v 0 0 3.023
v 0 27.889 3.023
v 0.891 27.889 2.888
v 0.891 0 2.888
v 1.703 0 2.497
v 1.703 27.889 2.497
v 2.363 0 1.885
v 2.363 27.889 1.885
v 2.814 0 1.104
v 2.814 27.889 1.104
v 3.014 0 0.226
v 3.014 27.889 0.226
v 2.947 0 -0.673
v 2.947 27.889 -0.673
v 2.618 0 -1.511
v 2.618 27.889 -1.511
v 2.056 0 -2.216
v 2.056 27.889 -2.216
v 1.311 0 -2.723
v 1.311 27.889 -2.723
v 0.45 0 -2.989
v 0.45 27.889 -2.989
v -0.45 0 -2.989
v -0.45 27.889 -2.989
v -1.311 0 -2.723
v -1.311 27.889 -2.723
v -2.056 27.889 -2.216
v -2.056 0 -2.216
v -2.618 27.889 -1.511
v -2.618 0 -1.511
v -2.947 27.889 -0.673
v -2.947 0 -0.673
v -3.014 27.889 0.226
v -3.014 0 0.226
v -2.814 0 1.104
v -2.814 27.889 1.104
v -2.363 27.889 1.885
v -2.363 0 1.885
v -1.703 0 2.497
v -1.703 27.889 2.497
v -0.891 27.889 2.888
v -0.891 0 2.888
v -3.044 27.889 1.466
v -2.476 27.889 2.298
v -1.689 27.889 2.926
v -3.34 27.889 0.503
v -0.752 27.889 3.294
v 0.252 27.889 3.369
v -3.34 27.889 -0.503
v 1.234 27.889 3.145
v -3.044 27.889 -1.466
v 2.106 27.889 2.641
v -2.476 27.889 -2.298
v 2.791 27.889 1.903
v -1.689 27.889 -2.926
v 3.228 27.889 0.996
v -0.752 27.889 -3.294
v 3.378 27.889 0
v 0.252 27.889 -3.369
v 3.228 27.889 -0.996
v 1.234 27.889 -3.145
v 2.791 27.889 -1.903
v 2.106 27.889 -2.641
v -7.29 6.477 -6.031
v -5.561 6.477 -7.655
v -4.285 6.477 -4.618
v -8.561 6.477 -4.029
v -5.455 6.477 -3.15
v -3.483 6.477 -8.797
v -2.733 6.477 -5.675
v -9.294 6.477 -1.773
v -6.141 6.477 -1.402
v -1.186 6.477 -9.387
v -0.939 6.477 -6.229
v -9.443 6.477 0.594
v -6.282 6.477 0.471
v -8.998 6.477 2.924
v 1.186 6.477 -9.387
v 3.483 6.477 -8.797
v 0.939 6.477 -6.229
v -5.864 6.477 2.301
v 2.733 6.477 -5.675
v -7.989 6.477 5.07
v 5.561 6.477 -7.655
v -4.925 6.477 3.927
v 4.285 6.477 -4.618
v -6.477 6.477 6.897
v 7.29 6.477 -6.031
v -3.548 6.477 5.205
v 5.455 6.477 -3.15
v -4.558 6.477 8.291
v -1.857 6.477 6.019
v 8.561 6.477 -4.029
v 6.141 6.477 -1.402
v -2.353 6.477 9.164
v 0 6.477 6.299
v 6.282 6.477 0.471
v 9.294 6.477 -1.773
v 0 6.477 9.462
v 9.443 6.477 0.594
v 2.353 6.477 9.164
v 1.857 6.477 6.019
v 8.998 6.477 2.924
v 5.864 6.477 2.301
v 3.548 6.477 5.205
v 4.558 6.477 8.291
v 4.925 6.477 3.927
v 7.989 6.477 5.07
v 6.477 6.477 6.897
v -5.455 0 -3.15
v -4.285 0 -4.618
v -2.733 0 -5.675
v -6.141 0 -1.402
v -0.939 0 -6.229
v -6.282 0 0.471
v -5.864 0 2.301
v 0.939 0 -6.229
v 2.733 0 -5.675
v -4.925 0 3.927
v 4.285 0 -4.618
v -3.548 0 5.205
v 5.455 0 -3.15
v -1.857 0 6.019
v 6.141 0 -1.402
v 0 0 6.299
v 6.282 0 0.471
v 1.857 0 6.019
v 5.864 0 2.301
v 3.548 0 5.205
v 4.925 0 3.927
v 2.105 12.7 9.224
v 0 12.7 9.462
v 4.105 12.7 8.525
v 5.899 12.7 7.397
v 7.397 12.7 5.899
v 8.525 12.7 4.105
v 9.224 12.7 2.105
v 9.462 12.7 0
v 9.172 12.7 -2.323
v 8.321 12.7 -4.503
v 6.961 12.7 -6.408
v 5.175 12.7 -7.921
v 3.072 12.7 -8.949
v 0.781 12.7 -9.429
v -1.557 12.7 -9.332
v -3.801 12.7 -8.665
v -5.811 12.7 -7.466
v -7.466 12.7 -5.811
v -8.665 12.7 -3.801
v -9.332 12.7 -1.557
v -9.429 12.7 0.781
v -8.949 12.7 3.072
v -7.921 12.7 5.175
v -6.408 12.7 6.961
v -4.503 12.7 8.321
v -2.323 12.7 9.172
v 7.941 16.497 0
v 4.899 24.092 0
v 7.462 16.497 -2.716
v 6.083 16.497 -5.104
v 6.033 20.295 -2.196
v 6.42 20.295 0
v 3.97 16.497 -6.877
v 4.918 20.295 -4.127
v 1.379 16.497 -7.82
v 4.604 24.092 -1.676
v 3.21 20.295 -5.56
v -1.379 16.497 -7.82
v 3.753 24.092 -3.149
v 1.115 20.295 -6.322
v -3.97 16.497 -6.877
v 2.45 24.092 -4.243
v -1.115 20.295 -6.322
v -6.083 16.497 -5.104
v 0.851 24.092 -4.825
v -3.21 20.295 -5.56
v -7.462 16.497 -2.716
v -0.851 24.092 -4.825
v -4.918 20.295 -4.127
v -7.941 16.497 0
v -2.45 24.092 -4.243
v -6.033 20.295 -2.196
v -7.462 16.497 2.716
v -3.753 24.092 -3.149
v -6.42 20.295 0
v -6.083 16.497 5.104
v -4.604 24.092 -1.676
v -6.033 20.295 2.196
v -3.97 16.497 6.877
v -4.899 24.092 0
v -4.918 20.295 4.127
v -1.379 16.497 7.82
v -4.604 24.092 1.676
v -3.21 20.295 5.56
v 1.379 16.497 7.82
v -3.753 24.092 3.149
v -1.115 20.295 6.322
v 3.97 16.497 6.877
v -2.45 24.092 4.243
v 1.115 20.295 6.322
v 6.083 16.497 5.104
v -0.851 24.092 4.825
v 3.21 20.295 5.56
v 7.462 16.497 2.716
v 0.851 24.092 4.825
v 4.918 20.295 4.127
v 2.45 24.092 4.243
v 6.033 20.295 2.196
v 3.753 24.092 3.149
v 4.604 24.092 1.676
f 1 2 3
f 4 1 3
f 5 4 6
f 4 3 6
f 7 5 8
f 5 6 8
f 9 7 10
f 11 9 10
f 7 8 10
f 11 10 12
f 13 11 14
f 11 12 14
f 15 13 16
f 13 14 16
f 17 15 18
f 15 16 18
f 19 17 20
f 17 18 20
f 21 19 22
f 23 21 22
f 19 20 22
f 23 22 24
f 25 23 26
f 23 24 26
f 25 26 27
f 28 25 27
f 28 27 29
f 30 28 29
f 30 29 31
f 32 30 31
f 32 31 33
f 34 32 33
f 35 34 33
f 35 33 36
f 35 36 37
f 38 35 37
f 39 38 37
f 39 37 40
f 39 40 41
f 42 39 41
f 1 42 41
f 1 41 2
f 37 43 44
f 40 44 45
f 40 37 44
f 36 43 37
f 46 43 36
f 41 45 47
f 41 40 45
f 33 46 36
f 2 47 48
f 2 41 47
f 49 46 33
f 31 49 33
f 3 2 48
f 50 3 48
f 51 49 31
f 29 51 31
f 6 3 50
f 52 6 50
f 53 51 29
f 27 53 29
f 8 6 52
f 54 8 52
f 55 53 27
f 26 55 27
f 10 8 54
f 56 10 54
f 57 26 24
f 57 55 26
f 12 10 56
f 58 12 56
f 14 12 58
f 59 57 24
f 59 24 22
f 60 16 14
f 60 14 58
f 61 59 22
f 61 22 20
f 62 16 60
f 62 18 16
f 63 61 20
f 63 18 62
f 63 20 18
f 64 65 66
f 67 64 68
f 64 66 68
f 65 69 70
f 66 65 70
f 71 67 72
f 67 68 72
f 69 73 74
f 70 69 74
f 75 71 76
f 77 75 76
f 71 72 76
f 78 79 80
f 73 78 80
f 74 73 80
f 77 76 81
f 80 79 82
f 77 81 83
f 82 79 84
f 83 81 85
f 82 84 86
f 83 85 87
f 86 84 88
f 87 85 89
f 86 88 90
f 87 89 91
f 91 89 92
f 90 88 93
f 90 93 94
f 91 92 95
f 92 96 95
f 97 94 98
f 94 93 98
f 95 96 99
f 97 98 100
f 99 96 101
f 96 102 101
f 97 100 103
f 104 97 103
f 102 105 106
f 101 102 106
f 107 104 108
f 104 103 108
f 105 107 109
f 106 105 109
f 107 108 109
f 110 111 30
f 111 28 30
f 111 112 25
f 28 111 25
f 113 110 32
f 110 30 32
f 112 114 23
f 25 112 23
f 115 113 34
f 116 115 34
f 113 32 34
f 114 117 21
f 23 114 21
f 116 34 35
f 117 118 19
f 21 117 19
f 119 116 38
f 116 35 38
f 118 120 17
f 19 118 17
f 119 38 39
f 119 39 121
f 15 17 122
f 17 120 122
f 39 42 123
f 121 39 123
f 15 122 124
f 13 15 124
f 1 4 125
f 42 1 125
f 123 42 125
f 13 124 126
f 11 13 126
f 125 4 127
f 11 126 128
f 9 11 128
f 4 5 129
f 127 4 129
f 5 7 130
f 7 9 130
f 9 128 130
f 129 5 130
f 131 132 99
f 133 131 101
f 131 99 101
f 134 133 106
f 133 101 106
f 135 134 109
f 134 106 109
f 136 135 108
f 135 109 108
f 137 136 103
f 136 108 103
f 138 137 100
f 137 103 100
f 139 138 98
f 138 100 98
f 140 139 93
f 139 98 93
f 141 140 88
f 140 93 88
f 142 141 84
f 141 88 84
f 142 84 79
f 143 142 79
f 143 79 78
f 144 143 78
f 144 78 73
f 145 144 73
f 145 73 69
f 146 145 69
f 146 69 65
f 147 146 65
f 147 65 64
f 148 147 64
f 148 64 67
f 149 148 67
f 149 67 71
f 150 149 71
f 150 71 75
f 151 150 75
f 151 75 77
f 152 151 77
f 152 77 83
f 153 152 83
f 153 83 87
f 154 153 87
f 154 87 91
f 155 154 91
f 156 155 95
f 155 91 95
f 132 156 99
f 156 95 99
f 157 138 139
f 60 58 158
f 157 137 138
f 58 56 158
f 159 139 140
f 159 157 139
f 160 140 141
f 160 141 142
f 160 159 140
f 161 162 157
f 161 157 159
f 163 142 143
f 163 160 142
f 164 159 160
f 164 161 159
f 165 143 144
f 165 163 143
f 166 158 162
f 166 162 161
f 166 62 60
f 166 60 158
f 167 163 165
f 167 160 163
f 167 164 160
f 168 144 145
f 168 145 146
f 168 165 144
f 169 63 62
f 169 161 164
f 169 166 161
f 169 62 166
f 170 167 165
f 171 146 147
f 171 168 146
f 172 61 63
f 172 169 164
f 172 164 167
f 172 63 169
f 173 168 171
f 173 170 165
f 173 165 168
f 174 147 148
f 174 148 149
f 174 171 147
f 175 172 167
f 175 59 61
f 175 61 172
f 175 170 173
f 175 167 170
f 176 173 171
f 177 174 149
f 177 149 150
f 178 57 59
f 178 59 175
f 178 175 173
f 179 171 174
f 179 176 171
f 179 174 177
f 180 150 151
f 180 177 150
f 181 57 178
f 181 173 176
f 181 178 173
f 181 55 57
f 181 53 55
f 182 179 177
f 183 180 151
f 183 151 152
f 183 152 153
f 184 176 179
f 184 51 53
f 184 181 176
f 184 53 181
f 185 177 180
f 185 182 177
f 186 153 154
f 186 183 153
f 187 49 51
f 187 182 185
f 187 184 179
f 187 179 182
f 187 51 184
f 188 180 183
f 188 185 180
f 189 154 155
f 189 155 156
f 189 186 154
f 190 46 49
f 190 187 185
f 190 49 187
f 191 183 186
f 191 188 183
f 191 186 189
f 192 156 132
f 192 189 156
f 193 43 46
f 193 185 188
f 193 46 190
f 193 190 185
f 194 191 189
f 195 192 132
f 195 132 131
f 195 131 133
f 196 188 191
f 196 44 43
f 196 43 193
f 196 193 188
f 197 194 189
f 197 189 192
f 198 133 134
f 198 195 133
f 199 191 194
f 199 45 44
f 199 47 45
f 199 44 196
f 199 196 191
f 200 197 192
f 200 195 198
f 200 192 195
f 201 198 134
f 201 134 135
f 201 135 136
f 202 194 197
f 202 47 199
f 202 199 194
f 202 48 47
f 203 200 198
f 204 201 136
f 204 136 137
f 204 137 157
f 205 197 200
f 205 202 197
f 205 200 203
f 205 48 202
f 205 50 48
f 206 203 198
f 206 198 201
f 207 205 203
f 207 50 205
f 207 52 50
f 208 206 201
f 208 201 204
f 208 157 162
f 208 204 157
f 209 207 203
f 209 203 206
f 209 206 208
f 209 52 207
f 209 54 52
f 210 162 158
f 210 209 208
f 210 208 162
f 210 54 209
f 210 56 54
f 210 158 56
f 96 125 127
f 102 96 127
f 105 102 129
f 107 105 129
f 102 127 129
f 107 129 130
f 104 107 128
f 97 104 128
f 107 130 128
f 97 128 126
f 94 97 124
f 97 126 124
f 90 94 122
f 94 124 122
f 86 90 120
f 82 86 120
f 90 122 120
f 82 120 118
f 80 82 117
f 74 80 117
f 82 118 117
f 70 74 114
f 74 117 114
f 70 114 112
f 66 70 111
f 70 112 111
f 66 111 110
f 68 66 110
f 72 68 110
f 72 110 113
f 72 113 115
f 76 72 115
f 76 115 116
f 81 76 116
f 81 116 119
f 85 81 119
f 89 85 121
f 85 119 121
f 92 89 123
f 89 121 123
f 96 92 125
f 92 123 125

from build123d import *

# Parameters (mm, degrees)
SKETCH1_R           = 6.2992
BOSS_EXTRUDE1_DEPTH = 6.477
SKETCH2_R           = 9.4615
BOSS_EXTRUDE2_DEPTH = 6.223
SKETCH5_R           = 9.4615
SKETCH6_R           = 3.3782
SKETCH7_R           = 3.0226
CUT_EXTRUDE1_DEPTH  = 31.932950796


with BuildPart() as part:
    # Sketch1 → Boss-Extrude1 (new body)
    with BuildSketch(Plane(origin=(0, 0, 0), x_dir=(1, 0, 0), z_dir=(0, 1, 0))):
        with Locations(Location((0, 0, 0), (0, 0, 270))):
            Circle(SKETCH1_R)
    extrude(amount=BOSS_EXTRUDE1_DEPTH)

    # Sketch2 → Boss-Extrude2 (add)
    with BuildSketch(Plane(origin=(0, 6.477, 0), x_dir=(1, 0, 0), z_dir=(0, 1, 0))):
        with Locations(Location((0, 0, 0), (0, 0, 270))):
            Circle(SKETCH2_R)
    extrude(amount=BOSS_EXTRUDE2_DEPTH)

    # Sketch5 → Loft2 section 0
    with BuildSketch(Plane(origin=(0, 12.7, 0), x_dir=(1, 0, 0), z_dir=(0, 1, 0))):
        Circle(SKETCH5_R)
    # Sketch6 → Loft2 section 1
    with BuildSketch(Plane(origin=(0, 27.8892, 0), x_dir=(1, 0, 0), z_dir=(0, 1, 0))):
        Circle(SKETCH6_R)
    loft()

    # Sketch7 → Cut-Extrude1 (cut, through all)
    with BuildSketch(Plane(origin=(0, 27.8892, 0), x_dir=(1, 0, 0), z_dir=(0, 1, 0))):
        with Locations(Location((0, 0, 0), (0, 0, 270))):
            Circle(SKETCH7_R)
    extrude(amount=-CUT_EXTRUDE1_DEPTH, mode=Mode.SUBTRACT)


solid = part.part
